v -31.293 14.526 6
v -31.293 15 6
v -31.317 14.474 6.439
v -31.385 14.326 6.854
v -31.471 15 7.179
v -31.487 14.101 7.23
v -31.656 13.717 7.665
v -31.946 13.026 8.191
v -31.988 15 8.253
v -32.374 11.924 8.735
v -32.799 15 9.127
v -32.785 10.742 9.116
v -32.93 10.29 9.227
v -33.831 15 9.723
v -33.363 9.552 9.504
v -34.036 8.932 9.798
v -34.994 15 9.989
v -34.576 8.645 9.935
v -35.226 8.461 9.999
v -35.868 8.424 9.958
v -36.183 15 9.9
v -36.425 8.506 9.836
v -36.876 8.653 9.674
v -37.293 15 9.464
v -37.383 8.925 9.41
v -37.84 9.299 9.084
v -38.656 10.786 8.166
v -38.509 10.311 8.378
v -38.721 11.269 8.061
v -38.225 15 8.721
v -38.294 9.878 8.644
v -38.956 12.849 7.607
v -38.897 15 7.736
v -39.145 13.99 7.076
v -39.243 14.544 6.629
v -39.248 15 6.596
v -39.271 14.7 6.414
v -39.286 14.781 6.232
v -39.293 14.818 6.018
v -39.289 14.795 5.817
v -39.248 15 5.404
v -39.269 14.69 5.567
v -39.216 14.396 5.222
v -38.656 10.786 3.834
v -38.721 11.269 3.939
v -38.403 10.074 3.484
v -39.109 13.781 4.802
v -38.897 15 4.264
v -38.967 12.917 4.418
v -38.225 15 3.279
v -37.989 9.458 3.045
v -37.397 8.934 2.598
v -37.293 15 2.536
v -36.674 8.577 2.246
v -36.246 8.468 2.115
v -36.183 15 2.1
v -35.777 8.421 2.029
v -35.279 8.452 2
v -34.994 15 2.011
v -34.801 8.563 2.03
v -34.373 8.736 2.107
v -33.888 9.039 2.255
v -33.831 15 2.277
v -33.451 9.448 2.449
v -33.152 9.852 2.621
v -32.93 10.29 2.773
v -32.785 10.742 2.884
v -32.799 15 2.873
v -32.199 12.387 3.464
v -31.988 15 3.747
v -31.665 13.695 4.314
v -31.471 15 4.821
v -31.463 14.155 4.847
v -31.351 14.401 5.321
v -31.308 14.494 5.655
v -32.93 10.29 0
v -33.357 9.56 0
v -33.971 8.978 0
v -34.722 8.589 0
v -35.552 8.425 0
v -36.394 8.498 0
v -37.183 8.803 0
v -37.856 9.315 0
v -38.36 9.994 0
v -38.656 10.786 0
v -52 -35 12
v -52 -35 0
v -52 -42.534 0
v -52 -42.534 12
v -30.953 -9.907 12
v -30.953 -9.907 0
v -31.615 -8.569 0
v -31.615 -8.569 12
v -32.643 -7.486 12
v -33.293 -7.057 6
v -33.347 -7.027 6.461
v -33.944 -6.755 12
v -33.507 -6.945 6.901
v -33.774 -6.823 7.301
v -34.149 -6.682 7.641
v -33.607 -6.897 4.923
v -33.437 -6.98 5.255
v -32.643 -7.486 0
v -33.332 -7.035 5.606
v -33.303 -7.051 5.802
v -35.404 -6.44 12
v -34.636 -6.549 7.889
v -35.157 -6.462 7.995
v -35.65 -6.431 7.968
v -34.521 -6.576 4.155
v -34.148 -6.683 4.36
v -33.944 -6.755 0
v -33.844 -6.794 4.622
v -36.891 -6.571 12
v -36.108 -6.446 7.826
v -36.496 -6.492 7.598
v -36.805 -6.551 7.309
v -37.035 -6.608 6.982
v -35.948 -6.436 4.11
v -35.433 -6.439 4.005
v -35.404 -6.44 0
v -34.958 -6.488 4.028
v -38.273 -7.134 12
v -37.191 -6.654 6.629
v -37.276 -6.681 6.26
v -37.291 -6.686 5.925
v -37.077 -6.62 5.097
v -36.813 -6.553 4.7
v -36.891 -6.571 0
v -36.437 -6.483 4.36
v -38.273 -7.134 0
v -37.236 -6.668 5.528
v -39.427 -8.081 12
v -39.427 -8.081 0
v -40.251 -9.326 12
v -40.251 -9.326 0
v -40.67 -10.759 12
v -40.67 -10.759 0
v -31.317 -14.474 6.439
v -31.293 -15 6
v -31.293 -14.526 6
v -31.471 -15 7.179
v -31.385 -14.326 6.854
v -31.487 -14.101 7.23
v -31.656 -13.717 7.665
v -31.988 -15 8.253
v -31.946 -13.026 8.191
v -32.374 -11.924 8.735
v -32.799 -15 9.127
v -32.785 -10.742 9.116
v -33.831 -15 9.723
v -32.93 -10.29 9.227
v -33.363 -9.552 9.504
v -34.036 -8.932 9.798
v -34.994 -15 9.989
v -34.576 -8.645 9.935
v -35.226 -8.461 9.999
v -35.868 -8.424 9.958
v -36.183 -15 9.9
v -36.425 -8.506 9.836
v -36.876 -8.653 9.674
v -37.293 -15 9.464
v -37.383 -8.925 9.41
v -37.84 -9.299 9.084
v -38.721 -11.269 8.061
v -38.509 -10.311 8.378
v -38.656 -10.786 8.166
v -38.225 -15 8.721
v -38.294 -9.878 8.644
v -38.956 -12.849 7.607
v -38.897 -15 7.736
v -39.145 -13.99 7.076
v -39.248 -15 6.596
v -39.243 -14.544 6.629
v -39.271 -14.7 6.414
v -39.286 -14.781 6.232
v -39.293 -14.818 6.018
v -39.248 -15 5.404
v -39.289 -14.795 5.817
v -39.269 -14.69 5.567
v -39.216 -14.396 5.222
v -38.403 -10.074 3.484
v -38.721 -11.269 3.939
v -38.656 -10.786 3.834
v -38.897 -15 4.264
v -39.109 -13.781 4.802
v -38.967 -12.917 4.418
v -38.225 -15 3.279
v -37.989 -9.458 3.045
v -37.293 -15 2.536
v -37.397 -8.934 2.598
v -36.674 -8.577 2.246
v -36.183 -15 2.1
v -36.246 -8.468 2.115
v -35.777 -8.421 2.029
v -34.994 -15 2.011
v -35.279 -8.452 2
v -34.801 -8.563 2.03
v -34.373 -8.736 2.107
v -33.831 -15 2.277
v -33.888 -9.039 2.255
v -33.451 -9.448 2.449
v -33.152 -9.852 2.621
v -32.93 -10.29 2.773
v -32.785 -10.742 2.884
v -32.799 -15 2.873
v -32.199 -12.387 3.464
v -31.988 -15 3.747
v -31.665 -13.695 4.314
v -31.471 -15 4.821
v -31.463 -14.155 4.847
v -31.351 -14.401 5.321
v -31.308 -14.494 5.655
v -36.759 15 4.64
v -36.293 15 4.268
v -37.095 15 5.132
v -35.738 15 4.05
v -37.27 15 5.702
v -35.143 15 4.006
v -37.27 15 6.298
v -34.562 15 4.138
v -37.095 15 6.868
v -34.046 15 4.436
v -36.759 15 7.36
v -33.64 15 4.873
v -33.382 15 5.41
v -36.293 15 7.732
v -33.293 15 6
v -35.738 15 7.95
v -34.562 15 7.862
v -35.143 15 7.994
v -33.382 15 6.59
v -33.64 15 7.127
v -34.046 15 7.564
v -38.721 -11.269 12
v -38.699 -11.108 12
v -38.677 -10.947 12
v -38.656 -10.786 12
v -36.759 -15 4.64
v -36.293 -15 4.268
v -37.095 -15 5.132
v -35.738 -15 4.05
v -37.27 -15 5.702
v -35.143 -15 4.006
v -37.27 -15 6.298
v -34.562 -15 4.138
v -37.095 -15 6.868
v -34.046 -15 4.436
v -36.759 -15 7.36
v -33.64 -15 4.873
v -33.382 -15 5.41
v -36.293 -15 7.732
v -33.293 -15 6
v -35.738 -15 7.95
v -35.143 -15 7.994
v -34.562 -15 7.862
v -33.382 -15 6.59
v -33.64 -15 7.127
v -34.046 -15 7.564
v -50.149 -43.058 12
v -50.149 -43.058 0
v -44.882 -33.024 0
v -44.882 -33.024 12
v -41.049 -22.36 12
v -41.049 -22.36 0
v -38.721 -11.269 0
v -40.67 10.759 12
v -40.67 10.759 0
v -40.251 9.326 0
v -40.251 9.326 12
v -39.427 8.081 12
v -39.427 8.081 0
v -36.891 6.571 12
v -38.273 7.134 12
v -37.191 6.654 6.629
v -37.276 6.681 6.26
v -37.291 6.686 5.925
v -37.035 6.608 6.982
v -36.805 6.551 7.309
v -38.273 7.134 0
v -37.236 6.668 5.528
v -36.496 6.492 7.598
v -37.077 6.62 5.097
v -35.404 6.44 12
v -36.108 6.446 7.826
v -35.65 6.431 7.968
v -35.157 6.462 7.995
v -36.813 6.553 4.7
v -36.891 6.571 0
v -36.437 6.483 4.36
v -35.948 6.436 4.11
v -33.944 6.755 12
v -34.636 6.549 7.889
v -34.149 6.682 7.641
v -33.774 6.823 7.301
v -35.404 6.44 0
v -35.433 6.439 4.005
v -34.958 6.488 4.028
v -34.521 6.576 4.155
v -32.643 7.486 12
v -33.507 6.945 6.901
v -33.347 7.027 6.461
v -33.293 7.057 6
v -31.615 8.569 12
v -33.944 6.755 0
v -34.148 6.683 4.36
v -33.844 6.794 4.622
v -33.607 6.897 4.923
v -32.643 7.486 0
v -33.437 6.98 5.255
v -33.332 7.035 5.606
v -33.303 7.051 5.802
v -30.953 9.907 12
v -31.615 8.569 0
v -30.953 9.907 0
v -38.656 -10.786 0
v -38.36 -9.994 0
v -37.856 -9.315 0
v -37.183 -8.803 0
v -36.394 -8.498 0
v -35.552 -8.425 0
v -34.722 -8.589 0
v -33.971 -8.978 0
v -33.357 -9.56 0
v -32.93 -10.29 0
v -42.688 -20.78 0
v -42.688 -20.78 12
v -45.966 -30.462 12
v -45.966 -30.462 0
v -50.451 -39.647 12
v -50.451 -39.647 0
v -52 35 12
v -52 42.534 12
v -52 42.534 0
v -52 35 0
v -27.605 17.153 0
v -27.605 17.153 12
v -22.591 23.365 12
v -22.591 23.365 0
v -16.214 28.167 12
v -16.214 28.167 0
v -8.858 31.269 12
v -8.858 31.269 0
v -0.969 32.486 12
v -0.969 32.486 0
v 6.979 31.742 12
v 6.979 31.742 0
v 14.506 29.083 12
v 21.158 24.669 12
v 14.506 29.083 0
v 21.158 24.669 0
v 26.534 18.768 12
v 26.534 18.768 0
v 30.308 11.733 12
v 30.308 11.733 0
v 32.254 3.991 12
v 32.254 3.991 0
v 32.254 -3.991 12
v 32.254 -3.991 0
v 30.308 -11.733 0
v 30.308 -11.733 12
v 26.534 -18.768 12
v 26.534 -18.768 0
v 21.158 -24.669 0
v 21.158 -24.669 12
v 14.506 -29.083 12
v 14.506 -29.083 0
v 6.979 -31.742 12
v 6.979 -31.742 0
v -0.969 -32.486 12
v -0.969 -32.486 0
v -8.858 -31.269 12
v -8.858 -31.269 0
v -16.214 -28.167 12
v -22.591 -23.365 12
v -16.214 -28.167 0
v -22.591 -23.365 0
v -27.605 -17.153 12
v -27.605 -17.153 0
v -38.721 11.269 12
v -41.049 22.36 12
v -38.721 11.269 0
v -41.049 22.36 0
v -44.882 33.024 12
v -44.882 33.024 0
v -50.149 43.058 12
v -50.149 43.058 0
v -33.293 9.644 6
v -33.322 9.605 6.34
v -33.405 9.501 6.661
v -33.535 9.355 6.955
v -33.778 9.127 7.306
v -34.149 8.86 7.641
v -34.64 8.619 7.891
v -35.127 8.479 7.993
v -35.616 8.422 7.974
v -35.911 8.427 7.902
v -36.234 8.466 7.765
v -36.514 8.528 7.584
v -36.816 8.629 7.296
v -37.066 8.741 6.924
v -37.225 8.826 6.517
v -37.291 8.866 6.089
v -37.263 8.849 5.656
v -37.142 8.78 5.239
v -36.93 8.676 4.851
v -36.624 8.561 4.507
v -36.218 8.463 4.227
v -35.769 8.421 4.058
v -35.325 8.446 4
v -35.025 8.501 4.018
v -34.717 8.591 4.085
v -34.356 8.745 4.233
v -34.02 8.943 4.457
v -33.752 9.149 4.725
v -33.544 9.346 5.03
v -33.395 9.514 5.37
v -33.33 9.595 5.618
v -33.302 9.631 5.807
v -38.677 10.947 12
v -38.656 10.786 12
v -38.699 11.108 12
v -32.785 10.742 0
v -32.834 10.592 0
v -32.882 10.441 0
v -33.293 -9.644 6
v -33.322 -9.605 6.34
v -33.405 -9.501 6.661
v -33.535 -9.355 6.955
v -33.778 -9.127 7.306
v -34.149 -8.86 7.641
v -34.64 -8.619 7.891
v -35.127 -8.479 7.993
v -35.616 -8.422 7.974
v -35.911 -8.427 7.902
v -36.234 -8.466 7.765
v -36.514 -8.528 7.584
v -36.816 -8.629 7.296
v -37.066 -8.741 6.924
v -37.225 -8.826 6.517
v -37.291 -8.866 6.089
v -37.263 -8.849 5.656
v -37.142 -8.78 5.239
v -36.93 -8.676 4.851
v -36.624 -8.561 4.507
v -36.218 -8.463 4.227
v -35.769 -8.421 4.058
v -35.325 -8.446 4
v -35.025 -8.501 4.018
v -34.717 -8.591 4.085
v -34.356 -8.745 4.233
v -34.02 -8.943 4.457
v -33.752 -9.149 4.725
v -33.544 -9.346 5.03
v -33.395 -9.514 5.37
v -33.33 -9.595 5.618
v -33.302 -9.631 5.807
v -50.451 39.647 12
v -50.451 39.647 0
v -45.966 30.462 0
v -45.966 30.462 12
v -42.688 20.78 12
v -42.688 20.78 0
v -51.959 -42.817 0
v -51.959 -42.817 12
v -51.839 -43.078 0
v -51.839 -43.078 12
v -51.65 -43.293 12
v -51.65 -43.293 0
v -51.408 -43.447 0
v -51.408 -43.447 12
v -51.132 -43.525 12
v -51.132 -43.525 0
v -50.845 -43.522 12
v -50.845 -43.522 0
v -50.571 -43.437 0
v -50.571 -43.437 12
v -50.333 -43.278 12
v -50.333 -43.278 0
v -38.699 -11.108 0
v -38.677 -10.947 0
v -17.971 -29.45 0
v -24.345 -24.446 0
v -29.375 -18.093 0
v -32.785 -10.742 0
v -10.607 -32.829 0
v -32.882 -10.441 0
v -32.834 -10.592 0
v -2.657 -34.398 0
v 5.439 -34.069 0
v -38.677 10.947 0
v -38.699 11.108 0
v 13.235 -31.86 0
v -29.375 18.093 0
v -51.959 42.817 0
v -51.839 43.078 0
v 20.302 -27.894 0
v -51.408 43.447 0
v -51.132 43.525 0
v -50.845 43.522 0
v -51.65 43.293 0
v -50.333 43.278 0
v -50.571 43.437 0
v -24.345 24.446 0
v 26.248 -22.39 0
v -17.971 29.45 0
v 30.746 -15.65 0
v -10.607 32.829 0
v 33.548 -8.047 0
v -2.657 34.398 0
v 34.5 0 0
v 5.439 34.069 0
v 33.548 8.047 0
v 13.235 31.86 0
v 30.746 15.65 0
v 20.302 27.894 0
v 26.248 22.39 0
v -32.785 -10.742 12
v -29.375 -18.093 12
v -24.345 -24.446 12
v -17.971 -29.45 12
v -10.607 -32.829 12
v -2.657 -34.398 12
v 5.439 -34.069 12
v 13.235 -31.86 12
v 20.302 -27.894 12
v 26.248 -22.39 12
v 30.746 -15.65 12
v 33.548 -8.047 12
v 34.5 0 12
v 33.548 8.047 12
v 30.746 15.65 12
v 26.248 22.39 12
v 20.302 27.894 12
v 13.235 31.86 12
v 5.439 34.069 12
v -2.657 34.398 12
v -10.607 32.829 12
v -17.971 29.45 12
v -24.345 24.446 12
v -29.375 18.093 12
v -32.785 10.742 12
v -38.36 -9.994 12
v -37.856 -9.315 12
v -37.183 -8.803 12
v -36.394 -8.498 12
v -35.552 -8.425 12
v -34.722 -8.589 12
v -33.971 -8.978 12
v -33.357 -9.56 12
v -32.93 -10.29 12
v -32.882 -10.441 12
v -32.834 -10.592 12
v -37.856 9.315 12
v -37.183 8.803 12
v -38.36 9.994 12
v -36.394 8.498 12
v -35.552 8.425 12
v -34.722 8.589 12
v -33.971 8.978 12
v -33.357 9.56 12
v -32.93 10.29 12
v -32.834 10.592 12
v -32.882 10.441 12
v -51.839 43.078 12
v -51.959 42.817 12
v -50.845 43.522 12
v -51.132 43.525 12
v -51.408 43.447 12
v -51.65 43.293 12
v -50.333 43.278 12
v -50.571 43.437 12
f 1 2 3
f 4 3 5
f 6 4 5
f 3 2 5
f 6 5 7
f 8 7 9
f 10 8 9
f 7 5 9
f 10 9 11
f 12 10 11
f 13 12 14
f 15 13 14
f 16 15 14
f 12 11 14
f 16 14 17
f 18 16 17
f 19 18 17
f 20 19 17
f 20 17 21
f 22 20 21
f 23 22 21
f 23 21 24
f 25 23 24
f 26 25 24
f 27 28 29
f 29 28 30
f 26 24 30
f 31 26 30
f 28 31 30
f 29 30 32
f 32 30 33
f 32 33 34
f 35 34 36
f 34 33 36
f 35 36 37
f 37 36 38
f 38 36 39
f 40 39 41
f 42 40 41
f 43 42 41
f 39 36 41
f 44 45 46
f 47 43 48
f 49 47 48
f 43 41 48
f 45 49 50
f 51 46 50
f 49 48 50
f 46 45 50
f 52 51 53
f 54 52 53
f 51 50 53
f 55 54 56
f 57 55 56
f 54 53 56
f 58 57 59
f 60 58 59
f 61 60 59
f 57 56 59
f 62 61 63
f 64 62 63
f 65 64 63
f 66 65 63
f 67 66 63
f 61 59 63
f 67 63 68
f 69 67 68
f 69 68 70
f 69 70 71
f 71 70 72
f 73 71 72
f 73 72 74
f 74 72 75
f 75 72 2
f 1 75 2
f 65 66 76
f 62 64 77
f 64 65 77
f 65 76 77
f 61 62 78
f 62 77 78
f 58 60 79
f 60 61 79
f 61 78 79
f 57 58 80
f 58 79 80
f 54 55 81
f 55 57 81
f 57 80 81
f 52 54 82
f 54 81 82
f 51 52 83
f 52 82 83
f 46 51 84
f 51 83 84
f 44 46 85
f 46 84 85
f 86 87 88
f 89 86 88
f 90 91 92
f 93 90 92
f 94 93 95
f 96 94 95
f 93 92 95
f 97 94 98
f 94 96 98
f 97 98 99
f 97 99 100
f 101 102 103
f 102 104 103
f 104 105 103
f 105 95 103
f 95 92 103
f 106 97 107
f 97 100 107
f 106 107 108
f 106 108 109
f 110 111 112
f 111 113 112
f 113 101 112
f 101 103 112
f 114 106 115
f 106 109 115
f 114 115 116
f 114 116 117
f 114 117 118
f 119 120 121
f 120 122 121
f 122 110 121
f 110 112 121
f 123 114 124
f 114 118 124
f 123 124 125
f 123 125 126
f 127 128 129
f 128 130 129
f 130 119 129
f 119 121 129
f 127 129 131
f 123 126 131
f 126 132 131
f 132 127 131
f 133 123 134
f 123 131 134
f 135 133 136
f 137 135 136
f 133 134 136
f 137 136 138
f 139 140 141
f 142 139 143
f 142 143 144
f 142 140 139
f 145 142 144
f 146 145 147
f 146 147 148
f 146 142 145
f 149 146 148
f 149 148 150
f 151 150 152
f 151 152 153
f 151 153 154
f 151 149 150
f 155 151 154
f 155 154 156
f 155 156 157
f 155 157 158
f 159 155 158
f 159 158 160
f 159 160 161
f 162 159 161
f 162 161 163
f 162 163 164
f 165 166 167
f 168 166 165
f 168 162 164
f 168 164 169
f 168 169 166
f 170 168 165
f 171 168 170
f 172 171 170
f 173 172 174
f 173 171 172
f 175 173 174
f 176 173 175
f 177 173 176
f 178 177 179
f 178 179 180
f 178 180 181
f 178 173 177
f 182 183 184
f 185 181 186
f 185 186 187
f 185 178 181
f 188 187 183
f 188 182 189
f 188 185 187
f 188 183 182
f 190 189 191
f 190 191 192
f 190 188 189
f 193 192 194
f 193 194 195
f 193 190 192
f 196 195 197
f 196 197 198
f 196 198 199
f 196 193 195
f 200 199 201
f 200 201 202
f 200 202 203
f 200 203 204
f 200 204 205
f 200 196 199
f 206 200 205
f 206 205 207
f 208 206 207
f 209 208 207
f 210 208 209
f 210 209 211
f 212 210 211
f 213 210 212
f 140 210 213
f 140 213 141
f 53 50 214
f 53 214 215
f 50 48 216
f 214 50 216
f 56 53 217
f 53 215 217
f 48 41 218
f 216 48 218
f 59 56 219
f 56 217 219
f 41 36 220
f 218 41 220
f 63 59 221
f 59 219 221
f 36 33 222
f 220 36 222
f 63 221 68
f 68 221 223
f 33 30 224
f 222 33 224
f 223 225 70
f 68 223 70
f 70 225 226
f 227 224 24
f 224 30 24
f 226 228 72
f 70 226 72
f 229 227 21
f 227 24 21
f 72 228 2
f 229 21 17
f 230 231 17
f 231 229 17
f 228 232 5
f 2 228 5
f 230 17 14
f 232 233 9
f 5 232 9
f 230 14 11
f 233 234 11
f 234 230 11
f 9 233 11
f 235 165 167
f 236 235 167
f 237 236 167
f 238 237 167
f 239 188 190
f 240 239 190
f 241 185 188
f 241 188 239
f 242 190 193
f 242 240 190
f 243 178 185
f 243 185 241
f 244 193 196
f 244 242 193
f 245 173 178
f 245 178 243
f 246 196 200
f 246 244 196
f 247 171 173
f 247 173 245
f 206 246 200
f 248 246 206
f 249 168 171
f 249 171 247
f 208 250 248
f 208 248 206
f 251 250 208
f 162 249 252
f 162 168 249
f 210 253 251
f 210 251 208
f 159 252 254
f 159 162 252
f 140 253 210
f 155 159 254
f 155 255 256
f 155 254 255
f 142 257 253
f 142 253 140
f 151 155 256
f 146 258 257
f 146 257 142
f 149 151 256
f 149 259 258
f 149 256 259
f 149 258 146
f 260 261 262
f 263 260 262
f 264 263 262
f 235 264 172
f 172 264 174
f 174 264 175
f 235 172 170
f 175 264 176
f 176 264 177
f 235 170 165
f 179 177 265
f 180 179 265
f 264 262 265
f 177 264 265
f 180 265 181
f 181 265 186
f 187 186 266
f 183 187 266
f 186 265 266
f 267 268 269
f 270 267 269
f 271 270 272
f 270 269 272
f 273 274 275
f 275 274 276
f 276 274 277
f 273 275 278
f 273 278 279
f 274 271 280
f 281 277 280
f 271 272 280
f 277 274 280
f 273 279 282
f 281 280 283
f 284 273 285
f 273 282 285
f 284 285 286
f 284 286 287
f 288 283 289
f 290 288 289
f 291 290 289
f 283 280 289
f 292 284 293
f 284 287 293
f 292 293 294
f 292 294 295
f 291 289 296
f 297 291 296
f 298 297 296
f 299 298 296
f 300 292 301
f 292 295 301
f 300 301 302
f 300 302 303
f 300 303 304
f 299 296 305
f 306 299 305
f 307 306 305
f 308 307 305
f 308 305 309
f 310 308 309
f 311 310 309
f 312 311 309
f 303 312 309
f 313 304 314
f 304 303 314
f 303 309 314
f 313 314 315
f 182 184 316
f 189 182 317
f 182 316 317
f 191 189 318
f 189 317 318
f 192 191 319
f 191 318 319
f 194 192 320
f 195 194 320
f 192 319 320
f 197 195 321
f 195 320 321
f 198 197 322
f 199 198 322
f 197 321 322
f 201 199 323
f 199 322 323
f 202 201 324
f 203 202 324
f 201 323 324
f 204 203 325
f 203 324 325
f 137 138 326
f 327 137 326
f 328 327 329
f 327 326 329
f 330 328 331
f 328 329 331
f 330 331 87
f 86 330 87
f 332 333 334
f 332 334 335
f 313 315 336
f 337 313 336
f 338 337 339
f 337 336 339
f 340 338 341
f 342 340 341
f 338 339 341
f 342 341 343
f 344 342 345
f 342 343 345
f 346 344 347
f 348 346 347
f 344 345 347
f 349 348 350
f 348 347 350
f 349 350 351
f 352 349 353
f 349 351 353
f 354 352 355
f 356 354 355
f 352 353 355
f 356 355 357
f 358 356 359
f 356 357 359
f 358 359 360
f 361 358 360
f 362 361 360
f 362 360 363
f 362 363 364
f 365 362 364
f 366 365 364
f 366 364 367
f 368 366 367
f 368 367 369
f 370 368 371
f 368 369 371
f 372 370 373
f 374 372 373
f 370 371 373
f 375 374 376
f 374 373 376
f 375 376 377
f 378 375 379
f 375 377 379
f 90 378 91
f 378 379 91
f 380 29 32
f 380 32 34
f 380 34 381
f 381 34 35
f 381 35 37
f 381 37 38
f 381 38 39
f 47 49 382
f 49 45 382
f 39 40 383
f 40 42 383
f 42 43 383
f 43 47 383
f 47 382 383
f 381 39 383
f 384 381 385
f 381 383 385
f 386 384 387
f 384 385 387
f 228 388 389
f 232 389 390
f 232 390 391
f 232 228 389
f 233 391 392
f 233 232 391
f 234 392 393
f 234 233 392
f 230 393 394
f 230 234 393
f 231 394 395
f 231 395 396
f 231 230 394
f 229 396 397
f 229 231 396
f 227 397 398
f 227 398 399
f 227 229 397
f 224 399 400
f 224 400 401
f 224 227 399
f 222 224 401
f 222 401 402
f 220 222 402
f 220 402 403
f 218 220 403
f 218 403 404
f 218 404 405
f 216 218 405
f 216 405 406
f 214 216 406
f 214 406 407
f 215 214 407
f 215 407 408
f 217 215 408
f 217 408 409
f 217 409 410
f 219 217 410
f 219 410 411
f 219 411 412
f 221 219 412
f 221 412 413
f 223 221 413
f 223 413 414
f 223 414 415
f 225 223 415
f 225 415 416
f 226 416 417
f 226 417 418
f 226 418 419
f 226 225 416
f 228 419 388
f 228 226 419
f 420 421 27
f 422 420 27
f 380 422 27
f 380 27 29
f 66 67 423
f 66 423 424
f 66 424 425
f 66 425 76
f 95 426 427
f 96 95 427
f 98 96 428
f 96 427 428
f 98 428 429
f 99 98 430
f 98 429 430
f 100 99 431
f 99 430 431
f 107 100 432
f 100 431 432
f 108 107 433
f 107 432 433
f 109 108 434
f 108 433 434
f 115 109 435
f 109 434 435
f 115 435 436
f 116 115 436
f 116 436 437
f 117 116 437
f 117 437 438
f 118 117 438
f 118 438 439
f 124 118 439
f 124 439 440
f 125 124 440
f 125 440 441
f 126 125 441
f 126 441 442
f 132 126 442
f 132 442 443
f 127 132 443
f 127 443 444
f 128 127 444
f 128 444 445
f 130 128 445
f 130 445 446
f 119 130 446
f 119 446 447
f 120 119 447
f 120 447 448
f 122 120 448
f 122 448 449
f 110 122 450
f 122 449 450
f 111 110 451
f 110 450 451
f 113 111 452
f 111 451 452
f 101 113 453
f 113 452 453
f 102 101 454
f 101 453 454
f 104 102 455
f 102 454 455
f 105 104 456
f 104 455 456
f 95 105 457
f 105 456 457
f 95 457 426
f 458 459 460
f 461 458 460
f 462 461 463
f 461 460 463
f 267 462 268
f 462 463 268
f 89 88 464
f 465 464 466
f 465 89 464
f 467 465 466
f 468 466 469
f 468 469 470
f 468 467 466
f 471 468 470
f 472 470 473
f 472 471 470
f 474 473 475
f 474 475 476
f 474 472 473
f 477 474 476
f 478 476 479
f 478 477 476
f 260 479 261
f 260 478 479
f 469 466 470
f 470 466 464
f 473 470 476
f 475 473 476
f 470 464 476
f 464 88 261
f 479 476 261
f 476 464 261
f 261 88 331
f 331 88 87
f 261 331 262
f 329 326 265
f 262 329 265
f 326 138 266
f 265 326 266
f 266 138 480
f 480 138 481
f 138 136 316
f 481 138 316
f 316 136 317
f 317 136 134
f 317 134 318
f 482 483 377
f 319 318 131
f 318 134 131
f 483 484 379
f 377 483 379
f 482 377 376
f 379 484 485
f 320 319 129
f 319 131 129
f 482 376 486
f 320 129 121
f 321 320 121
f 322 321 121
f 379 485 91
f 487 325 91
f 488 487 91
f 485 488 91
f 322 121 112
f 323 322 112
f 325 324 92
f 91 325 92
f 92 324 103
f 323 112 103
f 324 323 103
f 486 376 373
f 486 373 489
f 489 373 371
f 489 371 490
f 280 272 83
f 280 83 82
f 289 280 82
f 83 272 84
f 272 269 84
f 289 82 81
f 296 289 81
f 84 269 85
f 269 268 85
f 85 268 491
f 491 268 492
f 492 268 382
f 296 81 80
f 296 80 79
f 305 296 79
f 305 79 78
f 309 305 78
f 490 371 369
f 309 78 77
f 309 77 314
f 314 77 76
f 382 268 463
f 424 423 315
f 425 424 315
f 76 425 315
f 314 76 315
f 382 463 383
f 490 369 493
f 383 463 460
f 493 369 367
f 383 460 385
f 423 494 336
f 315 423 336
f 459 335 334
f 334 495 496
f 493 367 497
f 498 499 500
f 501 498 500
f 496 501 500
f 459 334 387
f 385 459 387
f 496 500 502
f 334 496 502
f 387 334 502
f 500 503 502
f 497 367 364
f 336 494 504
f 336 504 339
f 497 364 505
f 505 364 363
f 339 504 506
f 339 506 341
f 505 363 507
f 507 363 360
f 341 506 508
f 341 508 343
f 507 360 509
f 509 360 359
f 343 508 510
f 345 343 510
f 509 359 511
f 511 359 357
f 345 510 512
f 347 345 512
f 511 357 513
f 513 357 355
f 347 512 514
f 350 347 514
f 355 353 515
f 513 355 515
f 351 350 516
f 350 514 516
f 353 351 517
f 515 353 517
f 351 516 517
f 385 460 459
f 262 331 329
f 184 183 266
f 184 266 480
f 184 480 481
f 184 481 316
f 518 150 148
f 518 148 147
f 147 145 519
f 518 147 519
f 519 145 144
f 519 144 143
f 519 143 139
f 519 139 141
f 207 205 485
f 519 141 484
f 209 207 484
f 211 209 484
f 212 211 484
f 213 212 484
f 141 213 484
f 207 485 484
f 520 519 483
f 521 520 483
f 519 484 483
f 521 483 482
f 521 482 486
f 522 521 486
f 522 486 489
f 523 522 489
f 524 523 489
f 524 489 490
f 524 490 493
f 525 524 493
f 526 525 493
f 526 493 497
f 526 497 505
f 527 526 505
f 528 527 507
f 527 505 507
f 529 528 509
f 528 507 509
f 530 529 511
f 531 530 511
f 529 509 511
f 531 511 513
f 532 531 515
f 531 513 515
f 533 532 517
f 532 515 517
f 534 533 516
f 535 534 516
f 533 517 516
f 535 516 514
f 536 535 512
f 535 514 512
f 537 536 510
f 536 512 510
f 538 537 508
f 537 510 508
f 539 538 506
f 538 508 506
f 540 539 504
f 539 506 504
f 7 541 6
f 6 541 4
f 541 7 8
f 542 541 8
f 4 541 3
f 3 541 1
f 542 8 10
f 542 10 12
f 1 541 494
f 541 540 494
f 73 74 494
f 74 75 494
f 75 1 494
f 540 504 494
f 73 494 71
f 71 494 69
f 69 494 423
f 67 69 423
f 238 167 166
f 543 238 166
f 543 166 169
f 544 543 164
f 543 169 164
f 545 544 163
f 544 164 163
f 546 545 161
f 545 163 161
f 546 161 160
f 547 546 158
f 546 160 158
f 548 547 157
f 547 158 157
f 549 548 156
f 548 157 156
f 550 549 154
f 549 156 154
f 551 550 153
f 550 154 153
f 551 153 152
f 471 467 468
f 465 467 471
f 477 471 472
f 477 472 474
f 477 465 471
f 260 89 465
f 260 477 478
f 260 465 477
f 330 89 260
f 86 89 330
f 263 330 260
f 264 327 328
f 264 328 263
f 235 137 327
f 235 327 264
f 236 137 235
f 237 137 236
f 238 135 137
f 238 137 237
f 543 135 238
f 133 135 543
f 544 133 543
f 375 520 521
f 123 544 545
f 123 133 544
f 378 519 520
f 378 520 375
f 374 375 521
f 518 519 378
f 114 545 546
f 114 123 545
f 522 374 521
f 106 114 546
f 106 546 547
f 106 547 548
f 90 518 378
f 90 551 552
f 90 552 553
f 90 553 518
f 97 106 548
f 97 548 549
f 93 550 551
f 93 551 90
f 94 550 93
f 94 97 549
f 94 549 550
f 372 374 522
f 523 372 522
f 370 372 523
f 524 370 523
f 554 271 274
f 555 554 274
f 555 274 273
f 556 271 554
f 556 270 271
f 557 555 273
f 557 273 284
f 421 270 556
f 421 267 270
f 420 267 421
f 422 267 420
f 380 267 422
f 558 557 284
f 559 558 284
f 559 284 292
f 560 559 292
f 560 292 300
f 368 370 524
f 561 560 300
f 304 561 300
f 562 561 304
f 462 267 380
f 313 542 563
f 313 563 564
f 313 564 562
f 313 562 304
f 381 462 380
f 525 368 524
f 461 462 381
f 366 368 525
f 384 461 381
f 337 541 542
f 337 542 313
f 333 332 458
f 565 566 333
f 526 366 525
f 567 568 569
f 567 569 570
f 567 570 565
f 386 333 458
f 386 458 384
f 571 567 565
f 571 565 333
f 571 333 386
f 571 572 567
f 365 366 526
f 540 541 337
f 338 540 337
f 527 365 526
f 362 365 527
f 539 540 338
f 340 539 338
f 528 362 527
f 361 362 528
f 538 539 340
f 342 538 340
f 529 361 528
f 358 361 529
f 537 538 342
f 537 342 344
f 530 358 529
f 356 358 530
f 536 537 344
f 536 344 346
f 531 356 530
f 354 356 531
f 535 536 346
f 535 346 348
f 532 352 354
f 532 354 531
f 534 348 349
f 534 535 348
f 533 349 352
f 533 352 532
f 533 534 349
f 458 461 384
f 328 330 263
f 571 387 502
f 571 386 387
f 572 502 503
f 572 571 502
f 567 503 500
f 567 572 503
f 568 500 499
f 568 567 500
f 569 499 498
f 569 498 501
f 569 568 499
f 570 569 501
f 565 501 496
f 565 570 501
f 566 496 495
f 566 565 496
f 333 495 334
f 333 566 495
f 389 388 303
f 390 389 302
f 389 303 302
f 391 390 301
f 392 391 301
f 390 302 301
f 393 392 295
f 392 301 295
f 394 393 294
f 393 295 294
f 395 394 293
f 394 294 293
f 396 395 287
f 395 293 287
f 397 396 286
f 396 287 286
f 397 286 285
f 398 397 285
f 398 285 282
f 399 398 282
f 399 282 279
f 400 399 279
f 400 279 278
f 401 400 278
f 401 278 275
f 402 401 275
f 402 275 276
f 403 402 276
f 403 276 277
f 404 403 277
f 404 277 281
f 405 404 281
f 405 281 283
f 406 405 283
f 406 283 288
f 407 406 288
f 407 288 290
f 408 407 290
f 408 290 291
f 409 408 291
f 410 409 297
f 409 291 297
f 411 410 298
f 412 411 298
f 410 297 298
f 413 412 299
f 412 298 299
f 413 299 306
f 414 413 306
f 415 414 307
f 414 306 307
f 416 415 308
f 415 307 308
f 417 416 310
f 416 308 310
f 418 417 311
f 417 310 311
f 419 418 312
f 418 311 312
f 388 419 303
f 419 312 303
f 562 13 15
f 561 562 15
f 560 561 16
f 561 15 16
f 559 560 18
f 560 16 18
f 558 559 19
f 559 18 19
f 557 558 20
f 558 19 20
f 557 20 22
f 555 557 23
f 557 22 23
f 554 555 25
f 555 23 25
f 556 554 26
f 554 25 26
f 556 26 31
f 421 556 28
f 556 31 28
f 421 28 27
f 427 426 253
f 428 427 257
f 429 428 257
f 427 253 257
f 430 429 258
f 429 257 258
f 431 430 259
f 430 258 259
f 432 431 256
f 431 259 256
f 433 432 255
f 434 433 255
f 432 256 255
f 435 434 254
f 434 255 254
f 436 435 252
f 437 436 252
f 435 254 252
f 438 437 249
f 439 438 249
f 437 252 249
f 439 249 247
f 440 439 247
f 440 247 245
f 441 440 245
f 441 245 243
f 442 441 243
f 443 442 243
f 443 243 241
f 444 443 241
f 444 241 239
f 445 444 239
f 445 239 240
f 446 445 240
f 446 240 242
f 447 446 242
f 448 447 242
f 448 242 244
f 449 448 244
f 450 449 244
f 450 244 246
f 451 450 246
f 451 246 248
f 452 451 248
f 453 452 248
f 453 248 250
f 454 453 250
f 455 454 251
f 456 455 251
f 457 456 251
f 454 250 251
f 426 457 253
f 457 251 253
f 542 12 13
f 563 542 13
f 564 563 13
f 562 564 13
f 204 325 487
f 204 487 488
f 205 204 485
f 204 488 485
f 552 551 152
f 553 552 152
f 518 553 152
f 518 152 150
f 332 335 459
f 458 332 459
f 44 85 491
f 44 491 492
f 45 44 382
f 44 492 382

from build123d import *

# Parameters (mm, degrees)
F1_DEPTH = 12
F3_R     = 4
F3_R_2   = 2
F6_DEPTH = 100
F7_R     = 1


with BuildPart() as f1:
    # F0 (on Top) → F1 (new body)
    with BuildSketch(Plane.XY):
        with BuildLine():
            ThreePointArc((-30.9533166858, 9.9066738185), (32.5, 0), (-30.9533166858, -9.9066738185))
            ThreePointArc((-30.9533166858, -9.9066738185), (-36.1521865846, -6.4498953062), (-40.6700074334, -10.7588233268))
            ThreePointArc((-40.6700074334, -10.7588233268), (-44.1719937167, -25.6732051584), (-50.4508620887, -39.647413734))
            Line((-50.4508620887, -39.647413734), (-52, -35))
            Line((-52, -35), (-52, -45.9262987944))
            ThreePointArc((-52, -45.9262987944), (-43.3754164337, -29.3581013392), (-38.7212103105, -11.2686852631))
            ThreePointArc((-38.7212103105, -11.2686852631), (-38.6982701791, -11.0262325635), (-38.6558059993, -10.7864277375))
            ThreePointArc((-38.6558059993, -10.7864277375), (-35.9754973818, -8.4318261948), (-32.9297903997, -10.2897475302))
            ThreePointArc((-32.9297903997, -10.2897475302), (-32.8484099779, -10.5132023948), (-32.7849231086, -10.7423841283))
            ThreePointArc((-32.7849231086, -10.7423841283), (34.5, 0), (-32.7849231086, 10.7423841283))
            ThreePointArc((-32.7849231086, 10.7423841283), (-32.8484099779, 10.5132023948), (-32.9297903997, 10.2897475302))
            ThreePointArc((-32.9297903997, 10.2897475302), (-35.9754973818, 8.4318261948), (-38.6558059993, 10.7864277375))
            ThreePointArc((-38.6558059993, 10.7864277375), (-38.6982701791, 11.0262325635), (-38.7212103105, 11.2686852631))
            ThreePointArc((-38.7212103105, 11.2686852631), (-43.3754164337, 29.3581013392), (-52, 45.9262987944))
            Line((-52, 45.9262987944), (-52, 35))
            Line((-52, 35), (-50.4508620887, 39.647413734))
            ThreePointArc((-50.4508620887, 39.647413734), (-44.1719937167, 25.6732051584), (-40.6700074334, 10.7588233268))
            ThreePointArc((-40.6700074334, 10.7588233268), (-36.1521865846, 6.4498953062), (-30.9533166858, 9.9066738185))
        make_face()
        with BuildLine():
            ThreePointArc((-38.6558059993, -10.7864277375), (-38.6982701791, -11.0262325635), (-38.7212103105, -11.2686852631))
            ThreePointArc((-38.7212103105, -11.2686852631), (-38.6881506227, -11.0276049892), (-38.6558059993, -10.7864277375))
        make_face()
        with BuildLine():
            ThreePointArc((-38.6558059993, 10.7864277375), (-38.6881506227, 11.0276049892), (-38.7212103105, 11.2686852631))
            ThreePointArc((-38.7212103105, 11.2686852631), (-38.6982701791, 11.0262325635), (-38.6558059993, 10.7864277375))
        make_face()
        with BuildLine():
            ThreePointArc((-32.7849231086, -10.7423841283), (-32.8484099779, -10.5132023948), (-32.9297903997, -10.2897475302))
            ThreePointArc((-32.9297903997, -10.2897475302), (-32.8581361742, -10.5163152843), (-32.7849231086, -10.7423841283))
        make_face()
        with BuildLine():
            ThreePointArc((-32.7849231086, 10.7423841283), (-32.8581361742, 10.5163152843), (-32.9297903997, 10.2897475302))
            ThreePointArc((-32.9297903997, 10.2897475302), (-32.8484099779, 10.5132023948), (-32.7849231086, 10.7423841283))
        make_face()
    extrude(amount=F1_DEPTH)

    # F3 (on offset) → F4 (join, up to the next surface of F1)
    with BuildSketch(Plane.XZ.offset(15)):
        with Locations((-35.2927981995, 6)):
            Circle(F3_R)
        with Locations((-35.2927981995, 6)):
            Circle(F3_R_2, mode=Mode.SUBTRACT)
    extrude(until=Until.NEXT, dir=(0, 1, 0))

    # F5: F1 across plane


with BuildPart() as f1_1:
    add(f1.part)
    add(f1.part.mirror(Plane.XZ))

    # F3 (on offset) → F6 (cut)
    with BuildSketch(Plane.XZ.offset(15)):
        with Locations((-35.2927981995, 6)):
            Circle(F3_R_2)
    extrude(amount=-F6_DEPTH, mode=Mode.SUBTRACT)

    # F7
    f7_edges = [f1_1.edges().sort_by_distance(p)[0] for p in [
        (-52, -45.926299, 6),
        (-52, 45.926299, 6),
    ]]
    fillet(f7_edges, radius=F7_R)


solid = f1_1.part
